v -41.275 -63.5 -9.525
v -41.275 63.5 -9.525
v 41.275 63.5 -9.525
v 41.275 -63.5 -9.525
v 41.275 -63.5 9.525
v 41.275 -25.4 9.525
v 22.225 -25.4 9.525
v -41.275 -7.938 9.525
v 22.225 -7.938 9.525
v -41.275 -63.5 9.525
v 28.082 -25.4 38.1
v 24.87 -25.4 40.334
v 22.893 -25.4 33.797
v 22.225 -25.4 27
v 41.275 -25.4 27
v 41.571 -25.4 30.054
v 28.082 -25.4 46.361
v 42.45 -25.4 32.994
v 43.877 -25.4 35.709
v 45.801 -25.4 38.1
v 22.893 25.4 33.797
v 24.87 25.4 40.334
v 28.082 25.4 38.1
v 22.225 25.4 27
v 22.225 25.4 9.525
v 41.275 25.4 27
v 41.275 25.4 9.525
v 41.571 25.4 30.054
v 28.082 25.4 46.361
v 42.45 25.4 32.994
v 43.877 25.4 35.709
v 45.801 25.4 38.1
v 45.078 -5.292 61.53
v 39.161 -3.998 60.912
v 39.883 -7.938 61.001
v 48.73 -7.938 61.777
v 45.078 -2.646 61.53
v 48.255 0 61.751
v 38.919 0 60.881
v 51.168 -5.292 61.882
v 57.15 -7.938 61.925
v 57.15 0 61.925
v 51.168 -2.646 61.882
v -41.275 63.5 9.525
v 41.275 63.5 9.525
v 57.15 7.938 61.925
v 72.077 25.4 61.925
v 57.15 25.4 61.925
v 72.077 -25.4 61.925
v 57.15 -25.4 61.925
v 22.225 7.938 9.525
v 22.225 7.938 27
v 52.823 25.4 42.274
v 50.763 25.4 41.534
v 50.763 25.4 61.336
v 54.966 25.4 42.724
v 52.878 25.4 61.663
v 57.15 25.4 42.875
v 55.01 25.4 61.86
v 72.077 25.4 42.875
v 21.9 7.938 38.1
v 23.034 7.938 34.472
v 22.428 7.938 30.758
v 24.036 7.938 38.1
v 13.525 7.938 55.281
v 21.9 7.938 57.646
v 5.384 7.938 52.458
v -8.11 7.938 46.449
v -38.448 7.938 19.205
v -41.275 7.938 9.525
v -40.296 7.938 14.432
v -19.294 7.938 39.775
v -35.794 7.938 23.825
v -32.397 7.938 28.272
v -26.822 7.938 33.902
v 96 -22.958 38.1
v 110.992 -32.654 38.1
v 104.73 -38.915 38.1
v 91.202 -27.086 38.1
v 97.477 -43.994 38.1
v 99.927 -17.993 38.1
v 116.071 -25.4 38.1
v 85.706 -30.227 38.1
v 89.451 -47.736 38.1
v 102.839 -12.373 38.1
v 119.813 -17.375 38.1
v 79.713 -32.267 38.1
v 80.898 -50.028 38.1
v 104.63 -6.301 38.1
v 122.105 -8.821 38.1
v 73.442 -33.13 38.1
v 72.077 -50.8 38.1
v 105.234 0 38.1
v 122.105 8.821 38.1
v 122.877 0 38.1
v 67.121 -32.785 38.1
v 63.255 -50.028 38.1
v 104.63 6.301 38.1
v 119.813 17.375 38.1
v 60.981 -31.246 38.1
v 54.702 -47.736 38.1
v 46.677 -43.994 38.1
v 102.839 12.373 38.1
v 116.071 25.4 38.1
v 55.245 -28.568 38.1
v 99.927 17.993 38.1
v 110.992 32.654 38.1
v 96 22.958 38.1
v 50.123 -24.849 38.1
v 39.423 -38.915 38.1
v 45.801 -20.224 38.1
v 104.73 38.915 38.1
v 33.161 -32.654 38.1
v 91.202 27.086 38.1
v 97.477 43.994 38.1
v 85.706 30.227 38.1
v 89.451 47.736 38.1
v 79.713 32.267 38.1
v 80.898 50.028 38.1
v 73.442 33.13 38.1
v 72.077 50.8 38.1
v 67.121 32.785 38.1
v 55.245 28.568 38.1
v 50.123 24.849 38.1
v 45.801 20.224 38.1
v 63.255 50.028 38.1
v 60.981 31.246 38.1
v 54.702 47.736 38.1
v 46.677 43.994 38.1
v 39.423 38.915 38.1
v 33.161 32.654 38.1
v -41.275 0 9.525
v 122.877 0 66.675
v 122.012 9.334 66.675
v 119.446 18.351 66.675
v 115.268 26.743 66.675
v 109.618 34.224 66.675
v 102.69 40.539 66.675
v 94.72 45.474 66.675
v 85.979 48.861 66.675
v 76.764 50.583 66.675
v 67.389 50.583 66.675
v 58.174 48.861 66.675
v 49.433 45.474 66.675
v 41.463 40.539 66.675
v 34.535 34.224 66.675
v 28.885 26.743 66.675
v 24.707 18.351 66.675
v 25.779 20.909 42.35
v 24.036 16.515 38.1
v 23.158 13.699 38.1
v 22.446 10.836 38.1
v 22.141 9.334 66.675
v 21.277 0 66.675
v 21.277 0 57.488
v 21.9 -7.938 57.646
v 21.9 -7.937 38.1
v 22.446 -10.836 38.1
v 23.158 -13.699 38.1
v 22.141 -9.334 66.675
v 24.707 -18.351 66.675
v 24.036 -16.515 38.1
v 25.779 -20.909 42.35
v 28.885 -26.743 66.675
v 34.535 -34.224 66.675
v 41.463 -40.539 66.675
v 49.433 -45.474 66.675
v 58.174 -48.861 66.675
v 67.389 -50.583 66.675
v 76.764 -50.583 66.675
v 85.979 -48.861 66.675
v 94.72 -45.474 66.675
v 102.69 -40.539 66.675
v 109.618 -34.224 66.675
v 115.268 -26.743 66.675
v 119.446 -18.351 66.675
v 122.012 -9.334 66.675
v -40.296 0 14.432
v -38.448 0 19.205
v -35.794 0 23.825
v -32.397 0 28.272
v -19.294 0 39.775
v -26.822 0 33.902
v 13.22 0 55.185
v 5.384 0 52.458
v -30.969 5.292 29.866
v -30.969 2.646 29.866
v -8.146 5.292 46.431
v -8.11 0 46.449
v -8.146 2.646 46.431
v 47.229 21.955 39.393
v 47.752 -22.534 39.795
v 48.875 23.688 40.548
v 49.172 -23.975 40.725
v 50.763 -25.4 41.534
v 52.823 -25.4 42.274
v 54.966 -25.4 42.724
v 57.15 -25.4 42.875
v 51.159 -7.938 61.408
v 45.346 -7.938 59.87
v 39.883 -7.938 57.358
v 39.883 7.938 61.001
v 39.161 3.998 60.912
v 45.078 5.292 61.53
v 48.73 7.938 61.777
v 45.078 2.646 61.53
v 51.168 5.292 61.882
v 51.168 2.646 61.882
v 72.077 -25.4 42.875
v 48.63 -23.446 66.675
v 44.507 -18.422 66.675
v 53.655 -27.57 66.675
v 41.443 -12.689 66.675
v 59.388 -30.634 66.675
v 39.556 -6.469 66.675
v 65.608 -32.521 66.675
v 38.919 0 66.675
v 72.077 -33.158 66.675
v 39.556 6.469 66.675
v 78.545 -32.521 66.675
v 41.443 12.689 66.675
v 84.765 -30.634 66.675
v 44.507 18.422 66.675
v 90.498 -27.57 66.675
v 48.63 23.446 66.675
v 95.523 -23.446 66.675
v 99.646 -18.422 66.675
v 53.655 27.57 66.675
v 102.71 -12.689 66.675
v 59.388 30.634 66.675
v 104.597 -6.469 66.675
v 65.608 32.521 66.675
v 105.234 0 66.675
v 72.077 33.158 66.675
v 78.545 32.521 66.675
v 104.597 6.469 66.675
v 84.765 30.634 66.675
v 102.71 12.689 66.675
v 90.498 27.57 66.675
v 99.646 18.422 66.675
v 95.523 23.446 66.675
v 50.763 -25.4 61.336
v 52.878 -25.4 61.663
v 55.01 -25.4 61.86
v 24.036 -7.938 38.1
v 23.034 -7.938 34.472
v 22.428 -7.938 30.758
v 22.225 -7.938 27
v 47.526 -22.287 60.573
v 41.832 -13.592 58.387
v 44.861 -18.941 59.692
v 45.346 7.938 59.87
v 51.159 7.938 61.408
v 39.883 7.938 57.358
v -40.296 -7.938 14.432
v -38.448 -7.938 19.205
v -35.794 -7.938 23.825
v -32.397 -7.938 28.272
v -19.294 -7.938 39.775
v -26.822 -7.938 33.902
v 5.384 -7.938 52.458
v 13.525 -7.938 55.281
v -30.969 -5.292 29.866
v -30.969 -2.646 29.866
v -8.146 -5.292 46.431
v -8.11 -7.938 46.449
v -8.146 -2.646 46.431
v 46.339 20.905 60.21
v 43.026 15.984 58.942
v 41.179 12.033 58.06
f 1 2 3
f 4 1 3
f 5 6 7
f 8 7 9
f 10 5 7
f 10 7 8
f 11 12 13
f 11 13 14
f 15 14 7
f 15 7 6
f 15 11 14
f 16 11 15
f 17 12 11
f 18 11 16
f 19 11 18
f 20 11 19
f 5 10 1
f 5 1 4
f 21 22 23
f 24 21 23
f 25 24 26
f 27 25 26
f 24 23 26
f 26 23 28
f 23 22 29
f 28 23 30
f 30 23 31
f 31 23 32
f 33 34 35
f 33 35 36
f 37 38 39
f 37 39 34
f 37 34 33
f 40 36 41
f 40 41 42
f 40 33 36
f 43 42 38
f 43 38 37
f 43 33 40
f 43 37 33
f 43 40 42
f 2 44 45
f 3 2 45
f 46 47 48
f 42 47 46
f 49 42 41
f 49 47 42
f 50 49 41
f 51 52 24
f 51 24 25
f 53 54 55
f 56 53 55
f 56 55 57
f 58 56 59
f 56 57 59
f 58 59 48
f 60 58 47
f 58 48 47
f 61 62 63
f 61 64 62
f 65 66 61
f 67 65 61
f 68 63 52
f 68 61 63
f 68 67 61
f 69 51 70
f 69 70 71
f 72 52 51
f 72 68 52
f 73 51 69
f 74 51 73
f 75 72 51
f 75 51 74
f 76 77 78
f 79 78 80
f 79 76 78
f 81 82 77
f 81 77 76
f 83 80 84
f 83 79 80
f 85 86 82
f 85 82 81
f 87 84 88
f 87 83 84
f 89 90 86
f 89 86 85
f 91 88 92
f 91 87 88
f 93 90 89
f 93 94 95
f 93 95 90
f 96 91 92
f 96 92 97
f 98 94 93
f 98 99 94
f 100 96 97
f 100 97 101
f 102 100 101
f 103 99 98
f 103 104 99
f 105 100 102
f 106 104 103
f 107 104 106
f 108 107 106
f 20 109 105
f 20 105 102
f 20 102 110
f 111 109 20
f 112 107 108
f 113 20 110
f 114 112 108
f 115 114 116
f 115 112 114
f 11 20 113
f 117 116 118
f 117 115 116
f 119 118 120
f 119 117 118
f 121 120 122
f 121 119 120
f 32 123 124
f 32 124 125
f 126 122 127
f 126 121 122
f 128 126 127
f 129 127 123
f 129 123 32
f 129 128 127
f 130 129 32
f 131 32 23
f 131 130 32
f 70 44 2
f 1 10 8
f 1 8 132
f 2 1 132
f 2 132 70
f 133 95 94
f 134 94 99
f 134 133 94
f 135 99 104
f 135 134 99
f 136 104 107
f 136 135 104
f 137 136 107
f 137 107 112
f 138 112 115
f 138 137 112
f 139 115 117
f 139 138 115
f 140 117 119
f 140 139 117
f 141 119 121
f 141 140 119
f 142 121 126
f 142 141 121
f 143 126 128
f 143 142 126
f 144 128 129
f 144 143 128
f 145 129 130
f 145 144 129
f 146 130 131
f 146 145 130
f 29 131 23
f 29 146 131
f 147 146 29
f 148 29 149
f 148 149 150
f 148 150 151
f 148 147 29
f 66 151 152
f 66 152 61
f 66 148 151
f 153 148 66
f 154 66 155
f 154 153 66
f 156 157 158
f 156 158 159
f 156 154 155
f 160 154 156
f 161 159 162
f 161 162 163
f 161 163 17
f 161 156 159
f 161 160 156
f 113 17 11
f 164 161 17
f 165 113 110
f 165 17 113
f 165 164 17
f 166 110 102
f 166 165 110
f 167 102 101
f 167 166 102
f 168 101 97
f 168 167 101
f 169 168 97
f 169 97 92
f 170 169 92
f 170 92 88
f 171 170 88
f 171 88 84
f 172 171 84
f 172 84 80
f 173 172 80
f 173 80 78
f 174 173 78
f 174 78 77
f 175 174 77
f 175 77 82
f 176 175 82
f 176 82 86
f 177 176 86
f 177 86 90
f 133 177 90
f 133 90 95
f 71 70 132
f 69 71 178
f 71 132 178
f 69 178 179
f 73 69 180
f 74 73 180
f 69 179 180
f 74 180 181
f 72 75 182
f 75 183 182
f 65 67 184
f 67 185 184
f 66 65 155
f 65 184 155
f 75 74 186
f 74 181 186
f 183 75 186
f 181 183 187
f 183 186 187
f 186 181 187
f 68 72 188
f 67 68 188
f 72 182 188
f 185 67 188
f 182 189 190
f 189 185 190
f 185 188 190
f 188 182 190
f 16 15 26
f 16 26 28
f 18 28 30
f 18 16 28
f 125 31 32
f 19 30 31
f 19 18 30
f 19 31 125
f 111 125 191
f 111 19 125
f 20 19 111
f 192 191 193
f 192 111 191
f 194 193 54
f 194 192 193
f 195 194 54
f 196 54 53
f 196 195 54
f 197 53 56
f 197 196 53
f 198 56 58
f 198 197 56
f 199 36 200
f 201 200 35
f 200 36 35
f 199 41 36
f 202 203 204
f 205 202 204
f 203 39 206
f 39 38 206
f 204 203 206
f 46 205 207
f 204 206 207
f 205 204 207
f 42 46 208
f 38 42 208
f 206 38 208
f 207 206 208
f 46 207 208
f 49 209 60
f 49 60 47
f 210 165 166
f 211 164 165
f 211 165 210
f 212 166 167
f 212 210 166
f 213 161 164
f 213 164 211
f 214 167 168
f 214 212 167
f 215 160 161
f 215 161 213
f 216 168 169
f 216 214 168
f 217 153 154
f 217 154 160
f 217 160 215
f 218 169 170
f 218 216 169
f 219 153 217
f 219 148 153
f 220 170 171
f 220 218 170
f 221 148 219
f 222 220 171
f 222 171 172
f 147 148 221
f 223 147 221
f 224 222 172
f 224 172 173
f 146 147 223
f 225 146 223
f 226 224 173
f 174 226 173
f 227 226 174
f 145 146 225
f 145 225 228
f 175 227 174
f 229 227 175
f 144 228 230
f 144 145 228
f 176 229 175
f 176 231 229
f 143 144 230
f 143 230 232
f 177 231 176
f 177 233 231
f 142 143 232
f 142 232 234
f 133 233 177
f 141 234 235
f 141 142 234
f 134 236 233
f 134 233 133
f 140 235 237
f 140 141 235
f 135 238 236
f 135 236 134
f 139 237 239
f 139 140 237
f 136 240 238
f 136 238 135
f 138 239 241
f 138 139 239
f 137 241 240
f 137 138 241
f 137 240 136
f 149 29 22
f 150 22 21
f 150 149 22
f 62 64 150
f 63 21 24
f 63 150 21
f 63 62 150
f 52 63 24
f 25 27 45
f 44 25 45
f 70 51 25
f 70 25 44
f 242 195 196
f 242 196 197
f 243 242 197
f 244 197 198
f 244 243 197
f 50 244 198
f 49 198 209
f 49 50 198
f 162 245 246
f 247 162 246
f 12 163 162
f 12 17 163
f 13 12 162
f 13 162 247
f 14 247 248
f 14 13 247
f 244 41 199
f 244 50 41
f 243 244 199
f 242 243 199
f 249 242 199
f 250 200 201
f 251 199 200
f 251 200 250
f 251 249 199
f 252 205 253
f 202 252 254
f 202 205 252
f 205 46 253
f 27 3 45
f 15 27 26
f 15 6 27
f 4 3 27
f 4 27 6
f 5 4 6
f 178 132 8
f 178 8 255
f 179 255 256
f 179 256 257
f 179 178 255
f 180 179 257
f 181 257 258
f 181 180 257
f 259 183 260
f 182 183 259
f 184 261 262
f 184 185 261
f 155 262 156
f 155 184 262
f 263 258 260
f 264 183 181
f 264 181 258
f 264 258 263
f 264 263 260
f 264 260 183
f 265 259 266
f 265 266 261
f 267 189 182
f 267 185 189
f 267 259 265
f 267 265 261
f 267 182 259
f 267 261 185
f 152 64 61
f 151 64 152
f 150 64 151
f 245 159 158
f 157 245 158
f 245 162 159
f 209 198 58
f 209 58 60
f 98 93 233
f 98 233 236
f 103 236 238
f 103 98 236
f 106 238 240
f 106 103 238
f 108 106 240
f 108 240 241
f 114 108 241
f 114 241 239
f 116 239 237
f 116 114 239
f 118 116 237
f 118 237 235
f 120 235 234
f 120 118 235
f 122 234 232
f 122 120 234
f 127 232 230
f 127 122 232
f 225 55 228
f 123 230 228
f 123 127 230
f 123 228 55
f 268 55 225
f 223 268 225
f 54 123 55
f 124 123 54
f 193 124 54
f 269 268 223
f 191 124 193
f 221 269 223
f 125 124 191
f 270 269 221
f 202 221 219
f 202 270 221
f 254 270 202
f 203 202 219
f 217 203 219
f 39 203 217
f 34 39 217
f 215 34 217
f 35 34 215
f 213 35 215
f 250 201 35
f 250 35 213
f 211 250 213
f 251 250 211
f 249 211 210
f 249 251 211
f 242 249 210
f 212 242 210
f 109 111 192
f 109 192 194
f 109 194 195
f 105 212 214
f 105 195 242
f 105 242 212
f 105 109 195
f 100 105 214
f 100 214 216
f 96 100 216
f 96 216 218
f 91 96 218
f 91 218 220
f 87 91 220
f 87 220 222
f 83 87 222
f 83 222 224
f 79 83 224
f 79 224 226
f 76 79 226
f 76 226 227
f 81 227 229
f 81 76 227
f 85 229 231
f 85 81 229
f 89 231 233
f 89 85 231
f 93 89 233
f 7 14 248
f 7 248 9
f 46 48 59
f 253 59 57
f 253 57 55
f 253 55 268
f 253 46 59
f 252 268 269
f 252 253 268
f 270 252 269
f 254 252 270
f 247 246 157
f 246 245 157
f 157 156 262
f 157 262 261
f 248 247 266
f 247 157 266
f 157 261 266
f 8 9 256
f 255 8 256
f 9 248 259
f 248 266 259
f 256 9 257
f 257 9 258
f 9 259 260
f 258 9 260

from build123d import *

# Parameters (mm, degrees)
F1_DEPTH = 63.5
F2_DEPTH = 25.4
F3_DEPTH = 7.9375


with BuildPart() as f1:
    # F0 (on Front) → F1 (new body, symmetric)
    with BuildSketch(Plane.XZ):
        Polygon((-41.275, 9.525), (-41.275, -9.525), (41.275, -9.525), (41.275, 9.525), (22.225, 9.525), align=None)
    extrude(amount=F1_DEPTH, both=True)

    # F0 (on Front) → F2 (join, symmetric)
    with BuildSketch(Plane.XZ):
        with BuildLine():
            Line((22.225, 9.525), (41.275, 9.525))
            Line((41.275, 9.525), (41.275, 27.0002))
            ThreePointArc((41.275, 27.0002), (45.92468, 38.22552), (57.15, 42.8752))
            Line((57.15, 42.8752), (72.076506, 42.8752))
            Line((72.076506, 42.8752), (72.076506, 61.9252))
            Line((72.076506, 61.9252), (57.15, 61.9252))
            ThreePointArc((57.15, 61.9252), (32.454296, 51.695904), (22.225, 27.0002))
            Line((22.225, 27.0002), (22.225, 9.525))
        make_face()
    extrude(amount=F2_DEPTH, both=True)

    # F0 (on Front) → F3 (join, symmetric)
    with BuildSketch(Plane.XZ):
        with BuildLine():
            add(Edge.make_bspline(
                [(-41.275, 9.525), (-38.149111, 39.227815), (15.005312, 62.741945), (57.15, 61.9252)],
                knots=[0, 0, 0, 0, 111.504536, 111.504536, 111.504536, 111.504536], degree=3))
            Line((-41.275, 9.525), (22.225, 9.525))
            Line((22.225, 9.525), (22.225, 27.0002))
            ThreePointArc((22.225, 27.0002), (32.454296, 51.695904), (57.15, 61.9252))
        make_face()
    extrude(amount=F3_DEPTH, both=True)

    # F0 (on Front) → F4 (revolve)
    with BuildSketch(Plane.XZ):
        Polygon((105.234338, 66.675), (105.234338, 61.9252), (105.234338, 42.8752), (105.234338, 38.1), (122.876506, 38.1), (122.876506, 66.675), align=None)
    revolve(axis=Axis((72.076506, 0, 52.3875), (0, 0, 1)))


solid = f1.part
